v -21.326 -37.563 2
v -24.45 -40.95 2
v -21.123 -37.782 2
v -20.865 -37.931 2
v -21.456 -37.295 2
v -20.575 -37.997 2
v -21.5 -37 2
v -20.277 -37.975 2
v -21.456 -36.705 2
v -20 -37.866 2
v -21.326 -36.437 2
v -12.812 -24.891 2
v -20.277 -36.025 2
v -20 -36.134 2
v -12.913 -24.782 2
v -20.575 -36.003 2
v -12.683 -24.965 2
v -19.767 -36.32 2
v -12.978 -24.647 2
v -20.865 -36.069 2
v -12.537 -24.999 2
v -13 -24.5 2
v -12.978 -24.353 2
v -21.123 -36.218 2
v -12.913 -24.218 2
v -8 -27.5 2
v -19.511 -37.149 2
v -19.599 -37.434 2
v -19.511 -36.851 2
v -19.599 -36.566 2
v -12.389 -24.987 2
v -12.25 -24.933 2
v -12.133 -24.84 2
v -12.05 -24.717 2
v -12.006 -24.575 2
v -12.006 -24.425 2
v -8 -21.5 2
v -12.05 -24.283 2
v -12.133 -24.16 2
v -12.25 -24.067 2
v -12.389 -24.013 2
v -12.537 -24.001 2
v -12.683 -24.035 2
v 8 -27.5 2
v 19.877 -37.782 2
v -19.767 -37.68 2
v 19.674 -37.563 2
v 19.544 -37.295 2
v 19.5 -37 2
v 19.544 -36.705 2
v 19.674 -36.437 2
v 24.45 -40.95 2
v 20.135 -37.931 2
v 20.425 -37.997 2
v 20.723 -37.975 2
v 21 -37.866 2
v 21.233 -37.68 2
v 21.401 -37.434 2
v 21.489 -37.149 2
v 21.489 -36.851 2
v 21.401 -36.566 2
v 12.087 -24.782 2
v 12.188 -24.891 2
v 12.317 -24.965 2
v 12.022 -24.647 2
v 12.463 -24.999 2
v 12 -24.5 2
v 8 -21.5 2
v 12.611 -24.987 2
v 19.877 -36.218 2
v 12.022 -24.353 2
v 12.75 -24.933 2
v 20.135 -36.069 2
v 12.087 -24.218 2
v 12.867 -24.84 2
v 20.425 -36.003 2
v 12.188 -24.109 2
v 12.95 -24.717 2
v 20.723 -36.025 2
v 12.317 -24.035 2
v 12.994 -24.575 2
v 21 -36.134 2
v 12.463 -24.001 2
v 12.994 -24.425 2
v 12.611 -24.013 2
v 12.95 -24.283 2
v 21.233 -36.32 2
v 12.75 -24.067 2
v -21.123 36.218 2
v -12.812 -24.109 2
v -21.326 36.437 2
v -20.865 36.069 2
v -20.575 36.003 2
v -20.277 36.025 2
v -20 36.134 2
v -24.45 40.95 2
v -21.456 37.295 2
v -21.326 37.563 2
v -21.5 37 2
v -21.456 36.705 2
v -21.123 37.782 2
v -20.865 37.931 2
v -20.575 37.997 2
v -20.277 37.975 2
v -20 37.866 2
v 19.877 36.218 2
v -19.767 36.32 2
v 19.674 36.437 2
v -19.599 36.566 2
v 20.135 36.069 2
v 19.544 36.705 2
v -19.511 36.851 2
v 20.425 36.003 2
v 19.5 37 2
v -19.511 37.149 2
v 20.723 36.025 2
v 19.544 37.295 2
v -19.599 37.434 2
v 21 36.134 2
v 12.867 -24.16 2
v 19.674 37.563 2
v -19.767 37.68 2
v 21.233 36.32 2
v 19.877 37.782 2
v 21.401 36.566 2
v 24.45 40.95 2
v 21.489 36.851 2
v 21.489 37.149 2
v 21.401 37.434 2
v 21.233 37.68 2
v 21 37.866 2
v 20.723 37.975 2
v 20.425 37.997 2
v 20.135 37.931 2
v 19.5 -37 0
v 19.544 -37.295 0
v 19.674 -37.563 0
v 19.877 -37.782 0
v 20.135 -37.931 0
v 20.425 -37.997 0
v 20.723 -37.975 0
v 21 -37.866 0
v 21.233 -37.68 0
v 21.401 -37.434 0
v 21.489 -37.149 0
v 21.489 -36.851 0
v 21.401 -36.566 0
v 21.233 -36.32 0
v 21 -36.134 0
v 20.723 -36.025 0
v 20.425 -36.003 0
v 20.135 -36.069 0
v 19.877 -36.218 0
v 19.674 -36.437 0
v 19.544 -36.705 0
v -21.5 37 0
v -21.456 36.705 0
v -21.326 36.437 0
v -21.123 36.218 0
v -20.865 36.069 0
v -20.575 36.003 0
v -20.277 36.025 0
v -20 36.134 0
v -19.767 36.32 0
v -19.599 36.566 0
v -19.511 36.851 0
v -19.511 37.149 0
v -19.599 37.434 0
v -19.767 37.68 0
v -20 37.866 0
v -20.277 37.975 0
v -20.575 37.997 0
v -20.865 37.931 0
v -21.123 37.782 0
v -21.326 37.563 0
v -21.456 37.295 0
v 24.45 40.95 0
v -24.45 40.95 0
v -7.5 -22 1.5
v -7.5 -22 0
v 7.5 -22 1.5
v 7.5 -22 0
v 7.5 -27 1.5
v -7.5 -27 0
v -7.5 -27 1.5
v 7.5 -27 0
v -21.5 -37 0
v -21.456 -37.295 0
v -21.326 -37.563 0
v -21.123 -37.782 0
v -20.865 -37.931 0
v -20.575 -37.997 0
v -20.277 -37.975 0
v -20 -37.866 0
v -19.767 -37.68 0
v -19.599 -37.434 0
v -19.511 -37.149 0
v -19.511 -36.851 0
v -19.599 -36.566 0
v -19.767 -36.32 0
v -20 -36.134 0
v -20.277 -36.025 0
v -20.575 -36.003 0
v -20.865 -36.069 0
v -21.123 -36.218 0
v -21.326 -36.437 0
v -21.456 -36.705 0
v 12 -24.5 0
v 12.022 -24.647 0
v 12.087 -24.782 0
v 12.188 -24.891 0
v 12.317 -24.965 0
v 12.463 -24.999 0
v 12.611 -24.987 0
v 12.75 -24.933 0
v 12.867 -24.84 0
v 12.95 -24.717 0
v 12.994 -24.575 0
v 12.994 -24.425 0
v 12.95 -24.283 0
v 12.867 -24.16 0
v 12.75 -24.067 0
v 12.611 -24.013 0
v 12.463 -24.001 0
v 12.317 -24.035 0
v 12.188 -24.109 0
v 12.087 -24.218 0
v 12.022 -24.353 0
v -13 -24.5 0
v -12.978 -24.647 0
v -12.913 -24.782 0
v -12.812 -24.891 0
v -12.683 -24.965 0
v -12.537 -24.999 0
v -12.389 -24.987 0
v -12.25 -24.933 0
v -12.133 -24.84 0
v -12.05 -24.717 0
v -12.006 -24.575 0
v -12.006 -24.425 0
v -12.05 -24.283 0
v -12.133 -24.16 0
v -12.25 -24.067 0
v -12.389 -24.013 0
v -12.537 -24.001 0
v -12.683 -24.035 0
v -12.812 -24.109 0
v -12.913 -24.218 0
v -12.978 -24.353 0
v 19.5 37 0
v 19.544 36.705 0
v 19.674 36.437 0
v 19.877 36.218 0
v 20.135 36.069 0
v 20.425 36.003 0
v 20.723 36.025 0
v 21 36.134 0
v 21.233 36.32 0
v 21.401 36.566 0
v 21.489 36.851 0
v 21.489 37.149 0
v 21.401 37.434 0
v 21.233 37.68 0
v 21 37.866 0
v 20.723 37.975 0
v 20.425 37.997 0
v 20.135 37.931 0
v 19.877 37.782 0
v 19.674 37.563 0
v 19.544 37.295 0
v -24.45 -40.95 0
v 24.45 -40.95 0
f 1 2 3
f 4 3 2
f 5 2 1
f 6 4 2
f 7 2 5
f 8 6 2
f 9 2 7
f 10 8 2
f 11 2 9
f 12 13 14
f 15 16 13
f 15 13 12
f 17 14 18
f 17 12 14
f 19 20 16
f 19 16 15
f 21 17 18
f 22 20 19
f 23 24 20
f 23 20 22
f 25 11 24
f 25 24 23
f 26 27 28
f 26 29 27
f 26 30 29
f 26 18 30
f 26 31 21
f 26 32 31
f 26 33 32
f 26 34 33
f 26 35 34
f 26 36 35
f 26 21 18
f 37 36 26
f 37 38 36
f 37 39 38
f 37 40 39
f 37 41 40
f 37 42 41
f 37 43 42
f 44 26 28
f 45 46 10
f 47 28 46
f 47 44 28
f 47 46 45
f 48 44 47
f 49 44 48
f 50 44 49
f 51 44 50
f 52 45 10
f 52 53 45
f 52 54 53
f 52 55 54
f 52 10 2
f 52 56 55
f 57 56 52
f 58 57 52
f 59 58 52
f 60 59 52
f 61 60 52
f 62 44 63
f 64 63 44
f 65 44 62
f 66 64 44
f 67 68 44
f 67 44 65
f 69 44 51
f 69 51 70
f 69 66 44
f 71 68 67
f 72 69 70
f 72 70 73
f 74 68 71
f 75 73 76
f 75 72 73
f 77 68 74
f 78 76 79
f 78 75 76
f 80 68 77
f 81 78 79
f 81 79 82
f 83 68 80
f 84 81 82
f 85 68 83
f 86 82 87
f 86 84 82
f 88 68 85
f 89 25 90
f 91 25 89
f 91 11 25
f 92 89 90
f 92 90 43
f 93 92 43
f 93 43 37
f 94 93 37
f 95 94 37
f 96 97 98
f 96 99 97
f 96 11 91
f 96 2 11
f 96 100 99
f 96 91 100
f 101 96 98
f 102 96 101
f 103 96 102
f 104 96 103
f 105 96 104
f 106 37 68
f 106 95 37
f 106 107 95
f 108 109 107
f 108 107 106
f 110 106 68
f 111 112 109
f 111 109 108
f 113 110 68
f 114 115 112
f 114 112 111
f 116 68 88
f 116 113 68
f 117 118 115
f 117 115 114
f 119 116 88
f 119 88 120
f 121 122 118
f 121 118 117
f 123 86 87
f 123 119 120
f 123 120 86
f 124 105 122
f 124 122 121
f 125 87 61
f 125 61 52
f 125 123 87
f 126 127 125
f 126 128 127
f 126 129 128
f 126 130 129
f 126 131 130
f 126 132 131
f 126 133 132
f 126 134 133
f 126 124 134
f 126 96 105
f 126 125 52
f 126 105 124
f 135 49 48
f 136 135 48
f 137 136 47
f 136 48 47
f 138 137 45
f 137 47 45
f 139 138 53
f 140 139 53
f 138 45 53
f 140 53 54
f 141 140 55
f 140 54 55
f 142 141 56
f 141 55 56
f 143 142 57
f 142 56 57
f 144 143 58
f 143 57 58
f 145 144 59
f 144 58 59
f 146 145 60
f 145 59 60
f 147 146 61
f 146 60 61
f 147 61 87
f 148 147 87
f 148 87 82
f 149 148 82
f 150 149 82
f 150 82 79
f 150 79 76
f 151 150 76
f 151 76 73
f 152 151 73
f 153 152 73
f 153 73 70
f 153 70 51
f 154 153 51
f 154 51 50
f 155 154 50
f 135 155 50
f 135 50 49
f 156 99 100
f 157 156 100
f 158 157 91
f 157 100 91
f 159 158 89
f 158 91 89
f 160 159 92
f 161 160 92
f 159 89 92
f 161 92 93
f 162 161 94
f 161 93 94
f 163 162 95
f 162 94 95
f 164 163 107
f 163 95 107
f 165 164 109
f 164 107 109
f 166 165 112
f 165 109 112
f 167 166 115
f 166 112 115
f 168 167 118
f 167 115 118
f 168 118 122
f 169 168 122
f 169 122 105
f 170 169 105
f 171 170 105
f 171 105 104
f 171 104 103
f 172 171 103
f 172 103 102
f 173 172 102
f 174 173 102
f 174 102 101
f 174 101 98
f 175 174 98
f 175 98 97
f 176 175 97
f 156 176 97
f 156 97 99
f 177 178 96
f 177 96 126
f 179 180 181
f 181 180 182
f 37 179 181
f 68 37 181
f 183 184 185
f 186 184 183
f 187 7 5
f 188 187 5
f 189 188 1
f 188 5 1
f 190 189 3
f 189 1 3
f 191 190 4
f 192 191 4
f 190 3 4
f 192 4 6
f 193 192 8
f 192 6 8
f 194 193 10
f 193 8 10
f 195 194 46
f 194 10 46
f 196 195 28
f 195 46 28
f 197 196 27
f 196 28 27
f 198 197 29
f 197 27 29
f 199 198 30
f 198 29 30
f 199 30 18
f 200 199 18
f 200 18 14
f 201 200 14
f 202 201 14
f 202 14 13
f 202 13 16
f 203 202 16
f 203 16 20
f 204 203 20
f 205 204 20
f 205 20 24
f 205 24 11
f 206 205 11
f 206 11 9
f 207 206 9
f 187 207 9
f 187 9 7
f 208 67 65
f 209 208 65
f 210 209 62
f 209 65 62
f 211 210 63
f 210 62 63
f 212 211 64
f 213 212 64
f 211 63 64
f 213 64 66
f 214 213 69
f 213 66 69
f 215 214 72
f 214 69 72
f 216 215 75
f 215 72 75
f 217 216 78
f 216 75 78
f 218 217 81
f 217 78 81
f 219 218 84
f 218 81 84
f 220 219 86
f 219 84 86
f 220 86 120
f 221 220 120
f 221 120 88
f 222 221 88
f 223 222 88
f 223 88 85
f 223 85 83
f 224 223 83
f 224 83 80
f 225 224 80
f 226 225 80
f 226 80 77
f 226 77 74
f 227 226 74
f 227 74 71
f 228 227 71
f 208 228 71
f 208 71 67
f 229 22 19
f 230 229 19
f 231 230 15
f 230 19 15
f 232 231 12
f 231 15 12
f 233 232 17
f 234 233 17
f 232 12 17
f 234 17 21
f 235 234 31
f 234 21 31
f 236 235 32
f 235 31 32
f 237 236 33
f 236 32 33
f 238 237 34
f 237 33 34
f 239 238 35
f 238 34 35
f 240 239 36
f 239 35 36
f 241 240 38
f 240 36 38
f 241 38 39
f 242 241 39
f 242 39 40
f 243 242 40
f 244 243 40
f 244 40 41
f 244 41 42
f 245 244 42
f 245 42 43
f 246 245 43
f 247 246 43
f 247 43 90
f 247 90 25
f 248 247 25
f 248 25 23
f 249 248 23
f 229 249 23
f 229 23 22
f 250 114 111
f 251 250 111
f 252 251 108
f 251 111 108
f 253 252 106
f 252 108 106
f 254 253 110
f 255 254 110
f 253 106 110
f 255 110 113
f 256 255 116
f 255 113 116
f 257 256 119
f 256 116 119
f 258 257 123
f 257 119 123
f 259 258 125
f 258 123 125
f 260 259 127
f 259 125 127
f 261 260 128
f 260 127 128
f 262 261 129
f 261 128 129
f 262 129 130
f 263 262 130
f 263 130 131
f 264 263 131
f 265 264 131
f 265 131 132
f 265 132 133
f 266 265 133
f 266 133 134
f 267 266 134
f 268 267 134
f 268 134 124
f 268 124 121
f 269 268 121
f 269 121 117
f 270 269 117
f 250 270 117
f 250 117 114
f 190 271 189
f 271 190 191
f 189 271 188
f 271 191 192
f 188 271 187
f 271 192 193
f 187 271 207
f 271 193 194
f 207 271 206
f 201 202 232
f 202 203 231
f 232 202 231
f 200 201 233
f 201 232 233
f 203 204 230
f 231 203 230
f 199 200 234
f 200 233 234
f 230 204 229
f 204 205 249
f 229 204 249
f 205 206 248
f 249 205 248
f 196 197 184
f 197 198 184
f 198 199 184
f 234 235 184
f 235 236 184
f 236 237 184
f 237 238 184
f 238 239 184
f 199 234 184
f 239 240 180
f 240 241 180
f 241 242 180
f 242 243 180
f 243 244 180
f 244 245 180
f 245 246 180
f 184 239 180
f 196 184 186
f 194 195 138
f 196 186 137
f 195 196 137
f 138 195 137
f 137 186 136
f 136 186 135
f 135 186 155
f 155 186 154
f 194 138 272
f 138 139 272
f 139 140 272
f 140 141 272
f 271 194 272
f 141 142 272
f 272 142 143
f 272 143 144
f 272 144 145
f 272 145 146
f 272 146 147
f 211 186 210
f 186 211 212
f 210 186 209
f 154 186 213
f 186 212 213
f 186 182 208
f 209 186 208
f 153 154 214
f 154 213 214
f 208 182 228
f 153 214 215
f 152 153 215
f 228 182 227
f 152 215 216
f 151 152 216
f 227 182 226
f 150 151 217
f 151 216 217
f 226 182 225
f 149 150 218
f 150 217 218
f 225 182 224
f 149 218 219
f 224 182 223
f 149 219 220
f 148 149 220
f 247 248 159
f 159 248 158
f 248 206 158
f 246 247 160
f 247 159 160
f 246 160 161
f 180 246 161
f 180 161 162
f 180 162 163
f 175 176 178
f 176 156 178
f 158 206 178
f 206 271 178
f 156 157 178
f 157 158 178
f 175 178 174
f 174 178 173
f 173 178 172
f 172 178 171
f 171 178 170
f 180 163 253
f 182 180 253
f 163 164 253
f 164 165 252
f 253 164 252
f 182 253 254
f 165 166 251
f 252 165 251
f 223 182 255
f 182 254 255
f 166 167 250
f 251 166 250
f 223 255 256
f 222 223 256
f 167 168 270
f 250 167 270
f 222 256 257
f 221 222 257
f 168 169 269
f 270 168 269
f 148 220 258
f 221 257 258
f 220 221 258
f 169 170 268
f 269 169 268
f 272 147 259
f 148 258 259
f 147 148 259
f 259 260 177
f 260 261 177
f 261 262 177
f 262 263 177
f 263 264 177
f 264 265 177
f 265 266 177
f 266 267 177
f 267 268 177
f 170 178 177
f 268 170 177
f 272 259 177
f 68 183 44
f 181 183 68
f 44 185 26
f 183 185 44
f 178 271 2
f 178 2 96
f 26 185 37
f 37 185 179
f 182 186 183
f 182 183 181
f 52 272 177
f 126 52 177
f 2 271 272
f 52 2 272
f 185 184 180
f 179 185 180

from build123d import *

# Parameters (mm, degrees)
F0_W     = 48.9
F0_H     = 81.9
F0_W_2   = 15
F0_H_2   = 5
F1_DEPTH = 2
F2_D     = 2
F2_DEPTH = 15
F2_TIP   = 0.600860619
F3_D     = 1
F3_DEPTH = 15
F3_TIP   = 0.3004303095
F4_SIZE  = 0.5


with BuildPart() as f1:
    # F0 (on Top) → F1 (new body)
    with BuildSketch(Plane.XY):
        Rectangle(F0_W, F0_H)
        with Locations((0, -24.5)):
            Rectangle(F0_W_2, F0_H_2, mode=Mode.SUBTRACT)
    extrude(amount=F1_DEPTH)

    # F2
    with Locations(Plane(origin=(0, 0, 0), x_dir=(1, 0, 0), z_dir=(0, 0, -1))):
        with Locations((-20.5, -37), (20.5, -37), (-20.5, 37), (20.5, 37)):
            Hole(F2_D / 2, depth=F2_DEPTH)
            with Locations((0, 0, -(F2_DEPTH + F2_TIP / 2))):  # 118° drill point
                Cone(0, F2_D / 2, F2_TIP, mode=Mode.SUBTRACT)

    # F3
    with Locations(Plane(origin=(0, 0, 0), x_dir=(1, 0, 0), z_dir=(0, 0, -1))):
        with Locations((-12.5, 24.5), (12.5, 24.5)):
            Hole(F3_D / 2, depth=F3_DEPTH)
            with Locations((0, 0, -(F3_DEPTH + F3_TIP / 2))):  # 118° drill point
                Cone(0, F3_D / 2, F3_TIP, mode=Mode.SUBTRACT)

    # F4
    f4_edges = [f1.edges().sort_by_distance(p)[0] for p in [
        (0, -22, 2),
        (-7.5, -24.5, 2),
        (0, -27, 2),
        (7.5, -24.5, 2),
    ]]
    chamfer(f4_edges, length=F4_SIZE)


solid = f1.part
